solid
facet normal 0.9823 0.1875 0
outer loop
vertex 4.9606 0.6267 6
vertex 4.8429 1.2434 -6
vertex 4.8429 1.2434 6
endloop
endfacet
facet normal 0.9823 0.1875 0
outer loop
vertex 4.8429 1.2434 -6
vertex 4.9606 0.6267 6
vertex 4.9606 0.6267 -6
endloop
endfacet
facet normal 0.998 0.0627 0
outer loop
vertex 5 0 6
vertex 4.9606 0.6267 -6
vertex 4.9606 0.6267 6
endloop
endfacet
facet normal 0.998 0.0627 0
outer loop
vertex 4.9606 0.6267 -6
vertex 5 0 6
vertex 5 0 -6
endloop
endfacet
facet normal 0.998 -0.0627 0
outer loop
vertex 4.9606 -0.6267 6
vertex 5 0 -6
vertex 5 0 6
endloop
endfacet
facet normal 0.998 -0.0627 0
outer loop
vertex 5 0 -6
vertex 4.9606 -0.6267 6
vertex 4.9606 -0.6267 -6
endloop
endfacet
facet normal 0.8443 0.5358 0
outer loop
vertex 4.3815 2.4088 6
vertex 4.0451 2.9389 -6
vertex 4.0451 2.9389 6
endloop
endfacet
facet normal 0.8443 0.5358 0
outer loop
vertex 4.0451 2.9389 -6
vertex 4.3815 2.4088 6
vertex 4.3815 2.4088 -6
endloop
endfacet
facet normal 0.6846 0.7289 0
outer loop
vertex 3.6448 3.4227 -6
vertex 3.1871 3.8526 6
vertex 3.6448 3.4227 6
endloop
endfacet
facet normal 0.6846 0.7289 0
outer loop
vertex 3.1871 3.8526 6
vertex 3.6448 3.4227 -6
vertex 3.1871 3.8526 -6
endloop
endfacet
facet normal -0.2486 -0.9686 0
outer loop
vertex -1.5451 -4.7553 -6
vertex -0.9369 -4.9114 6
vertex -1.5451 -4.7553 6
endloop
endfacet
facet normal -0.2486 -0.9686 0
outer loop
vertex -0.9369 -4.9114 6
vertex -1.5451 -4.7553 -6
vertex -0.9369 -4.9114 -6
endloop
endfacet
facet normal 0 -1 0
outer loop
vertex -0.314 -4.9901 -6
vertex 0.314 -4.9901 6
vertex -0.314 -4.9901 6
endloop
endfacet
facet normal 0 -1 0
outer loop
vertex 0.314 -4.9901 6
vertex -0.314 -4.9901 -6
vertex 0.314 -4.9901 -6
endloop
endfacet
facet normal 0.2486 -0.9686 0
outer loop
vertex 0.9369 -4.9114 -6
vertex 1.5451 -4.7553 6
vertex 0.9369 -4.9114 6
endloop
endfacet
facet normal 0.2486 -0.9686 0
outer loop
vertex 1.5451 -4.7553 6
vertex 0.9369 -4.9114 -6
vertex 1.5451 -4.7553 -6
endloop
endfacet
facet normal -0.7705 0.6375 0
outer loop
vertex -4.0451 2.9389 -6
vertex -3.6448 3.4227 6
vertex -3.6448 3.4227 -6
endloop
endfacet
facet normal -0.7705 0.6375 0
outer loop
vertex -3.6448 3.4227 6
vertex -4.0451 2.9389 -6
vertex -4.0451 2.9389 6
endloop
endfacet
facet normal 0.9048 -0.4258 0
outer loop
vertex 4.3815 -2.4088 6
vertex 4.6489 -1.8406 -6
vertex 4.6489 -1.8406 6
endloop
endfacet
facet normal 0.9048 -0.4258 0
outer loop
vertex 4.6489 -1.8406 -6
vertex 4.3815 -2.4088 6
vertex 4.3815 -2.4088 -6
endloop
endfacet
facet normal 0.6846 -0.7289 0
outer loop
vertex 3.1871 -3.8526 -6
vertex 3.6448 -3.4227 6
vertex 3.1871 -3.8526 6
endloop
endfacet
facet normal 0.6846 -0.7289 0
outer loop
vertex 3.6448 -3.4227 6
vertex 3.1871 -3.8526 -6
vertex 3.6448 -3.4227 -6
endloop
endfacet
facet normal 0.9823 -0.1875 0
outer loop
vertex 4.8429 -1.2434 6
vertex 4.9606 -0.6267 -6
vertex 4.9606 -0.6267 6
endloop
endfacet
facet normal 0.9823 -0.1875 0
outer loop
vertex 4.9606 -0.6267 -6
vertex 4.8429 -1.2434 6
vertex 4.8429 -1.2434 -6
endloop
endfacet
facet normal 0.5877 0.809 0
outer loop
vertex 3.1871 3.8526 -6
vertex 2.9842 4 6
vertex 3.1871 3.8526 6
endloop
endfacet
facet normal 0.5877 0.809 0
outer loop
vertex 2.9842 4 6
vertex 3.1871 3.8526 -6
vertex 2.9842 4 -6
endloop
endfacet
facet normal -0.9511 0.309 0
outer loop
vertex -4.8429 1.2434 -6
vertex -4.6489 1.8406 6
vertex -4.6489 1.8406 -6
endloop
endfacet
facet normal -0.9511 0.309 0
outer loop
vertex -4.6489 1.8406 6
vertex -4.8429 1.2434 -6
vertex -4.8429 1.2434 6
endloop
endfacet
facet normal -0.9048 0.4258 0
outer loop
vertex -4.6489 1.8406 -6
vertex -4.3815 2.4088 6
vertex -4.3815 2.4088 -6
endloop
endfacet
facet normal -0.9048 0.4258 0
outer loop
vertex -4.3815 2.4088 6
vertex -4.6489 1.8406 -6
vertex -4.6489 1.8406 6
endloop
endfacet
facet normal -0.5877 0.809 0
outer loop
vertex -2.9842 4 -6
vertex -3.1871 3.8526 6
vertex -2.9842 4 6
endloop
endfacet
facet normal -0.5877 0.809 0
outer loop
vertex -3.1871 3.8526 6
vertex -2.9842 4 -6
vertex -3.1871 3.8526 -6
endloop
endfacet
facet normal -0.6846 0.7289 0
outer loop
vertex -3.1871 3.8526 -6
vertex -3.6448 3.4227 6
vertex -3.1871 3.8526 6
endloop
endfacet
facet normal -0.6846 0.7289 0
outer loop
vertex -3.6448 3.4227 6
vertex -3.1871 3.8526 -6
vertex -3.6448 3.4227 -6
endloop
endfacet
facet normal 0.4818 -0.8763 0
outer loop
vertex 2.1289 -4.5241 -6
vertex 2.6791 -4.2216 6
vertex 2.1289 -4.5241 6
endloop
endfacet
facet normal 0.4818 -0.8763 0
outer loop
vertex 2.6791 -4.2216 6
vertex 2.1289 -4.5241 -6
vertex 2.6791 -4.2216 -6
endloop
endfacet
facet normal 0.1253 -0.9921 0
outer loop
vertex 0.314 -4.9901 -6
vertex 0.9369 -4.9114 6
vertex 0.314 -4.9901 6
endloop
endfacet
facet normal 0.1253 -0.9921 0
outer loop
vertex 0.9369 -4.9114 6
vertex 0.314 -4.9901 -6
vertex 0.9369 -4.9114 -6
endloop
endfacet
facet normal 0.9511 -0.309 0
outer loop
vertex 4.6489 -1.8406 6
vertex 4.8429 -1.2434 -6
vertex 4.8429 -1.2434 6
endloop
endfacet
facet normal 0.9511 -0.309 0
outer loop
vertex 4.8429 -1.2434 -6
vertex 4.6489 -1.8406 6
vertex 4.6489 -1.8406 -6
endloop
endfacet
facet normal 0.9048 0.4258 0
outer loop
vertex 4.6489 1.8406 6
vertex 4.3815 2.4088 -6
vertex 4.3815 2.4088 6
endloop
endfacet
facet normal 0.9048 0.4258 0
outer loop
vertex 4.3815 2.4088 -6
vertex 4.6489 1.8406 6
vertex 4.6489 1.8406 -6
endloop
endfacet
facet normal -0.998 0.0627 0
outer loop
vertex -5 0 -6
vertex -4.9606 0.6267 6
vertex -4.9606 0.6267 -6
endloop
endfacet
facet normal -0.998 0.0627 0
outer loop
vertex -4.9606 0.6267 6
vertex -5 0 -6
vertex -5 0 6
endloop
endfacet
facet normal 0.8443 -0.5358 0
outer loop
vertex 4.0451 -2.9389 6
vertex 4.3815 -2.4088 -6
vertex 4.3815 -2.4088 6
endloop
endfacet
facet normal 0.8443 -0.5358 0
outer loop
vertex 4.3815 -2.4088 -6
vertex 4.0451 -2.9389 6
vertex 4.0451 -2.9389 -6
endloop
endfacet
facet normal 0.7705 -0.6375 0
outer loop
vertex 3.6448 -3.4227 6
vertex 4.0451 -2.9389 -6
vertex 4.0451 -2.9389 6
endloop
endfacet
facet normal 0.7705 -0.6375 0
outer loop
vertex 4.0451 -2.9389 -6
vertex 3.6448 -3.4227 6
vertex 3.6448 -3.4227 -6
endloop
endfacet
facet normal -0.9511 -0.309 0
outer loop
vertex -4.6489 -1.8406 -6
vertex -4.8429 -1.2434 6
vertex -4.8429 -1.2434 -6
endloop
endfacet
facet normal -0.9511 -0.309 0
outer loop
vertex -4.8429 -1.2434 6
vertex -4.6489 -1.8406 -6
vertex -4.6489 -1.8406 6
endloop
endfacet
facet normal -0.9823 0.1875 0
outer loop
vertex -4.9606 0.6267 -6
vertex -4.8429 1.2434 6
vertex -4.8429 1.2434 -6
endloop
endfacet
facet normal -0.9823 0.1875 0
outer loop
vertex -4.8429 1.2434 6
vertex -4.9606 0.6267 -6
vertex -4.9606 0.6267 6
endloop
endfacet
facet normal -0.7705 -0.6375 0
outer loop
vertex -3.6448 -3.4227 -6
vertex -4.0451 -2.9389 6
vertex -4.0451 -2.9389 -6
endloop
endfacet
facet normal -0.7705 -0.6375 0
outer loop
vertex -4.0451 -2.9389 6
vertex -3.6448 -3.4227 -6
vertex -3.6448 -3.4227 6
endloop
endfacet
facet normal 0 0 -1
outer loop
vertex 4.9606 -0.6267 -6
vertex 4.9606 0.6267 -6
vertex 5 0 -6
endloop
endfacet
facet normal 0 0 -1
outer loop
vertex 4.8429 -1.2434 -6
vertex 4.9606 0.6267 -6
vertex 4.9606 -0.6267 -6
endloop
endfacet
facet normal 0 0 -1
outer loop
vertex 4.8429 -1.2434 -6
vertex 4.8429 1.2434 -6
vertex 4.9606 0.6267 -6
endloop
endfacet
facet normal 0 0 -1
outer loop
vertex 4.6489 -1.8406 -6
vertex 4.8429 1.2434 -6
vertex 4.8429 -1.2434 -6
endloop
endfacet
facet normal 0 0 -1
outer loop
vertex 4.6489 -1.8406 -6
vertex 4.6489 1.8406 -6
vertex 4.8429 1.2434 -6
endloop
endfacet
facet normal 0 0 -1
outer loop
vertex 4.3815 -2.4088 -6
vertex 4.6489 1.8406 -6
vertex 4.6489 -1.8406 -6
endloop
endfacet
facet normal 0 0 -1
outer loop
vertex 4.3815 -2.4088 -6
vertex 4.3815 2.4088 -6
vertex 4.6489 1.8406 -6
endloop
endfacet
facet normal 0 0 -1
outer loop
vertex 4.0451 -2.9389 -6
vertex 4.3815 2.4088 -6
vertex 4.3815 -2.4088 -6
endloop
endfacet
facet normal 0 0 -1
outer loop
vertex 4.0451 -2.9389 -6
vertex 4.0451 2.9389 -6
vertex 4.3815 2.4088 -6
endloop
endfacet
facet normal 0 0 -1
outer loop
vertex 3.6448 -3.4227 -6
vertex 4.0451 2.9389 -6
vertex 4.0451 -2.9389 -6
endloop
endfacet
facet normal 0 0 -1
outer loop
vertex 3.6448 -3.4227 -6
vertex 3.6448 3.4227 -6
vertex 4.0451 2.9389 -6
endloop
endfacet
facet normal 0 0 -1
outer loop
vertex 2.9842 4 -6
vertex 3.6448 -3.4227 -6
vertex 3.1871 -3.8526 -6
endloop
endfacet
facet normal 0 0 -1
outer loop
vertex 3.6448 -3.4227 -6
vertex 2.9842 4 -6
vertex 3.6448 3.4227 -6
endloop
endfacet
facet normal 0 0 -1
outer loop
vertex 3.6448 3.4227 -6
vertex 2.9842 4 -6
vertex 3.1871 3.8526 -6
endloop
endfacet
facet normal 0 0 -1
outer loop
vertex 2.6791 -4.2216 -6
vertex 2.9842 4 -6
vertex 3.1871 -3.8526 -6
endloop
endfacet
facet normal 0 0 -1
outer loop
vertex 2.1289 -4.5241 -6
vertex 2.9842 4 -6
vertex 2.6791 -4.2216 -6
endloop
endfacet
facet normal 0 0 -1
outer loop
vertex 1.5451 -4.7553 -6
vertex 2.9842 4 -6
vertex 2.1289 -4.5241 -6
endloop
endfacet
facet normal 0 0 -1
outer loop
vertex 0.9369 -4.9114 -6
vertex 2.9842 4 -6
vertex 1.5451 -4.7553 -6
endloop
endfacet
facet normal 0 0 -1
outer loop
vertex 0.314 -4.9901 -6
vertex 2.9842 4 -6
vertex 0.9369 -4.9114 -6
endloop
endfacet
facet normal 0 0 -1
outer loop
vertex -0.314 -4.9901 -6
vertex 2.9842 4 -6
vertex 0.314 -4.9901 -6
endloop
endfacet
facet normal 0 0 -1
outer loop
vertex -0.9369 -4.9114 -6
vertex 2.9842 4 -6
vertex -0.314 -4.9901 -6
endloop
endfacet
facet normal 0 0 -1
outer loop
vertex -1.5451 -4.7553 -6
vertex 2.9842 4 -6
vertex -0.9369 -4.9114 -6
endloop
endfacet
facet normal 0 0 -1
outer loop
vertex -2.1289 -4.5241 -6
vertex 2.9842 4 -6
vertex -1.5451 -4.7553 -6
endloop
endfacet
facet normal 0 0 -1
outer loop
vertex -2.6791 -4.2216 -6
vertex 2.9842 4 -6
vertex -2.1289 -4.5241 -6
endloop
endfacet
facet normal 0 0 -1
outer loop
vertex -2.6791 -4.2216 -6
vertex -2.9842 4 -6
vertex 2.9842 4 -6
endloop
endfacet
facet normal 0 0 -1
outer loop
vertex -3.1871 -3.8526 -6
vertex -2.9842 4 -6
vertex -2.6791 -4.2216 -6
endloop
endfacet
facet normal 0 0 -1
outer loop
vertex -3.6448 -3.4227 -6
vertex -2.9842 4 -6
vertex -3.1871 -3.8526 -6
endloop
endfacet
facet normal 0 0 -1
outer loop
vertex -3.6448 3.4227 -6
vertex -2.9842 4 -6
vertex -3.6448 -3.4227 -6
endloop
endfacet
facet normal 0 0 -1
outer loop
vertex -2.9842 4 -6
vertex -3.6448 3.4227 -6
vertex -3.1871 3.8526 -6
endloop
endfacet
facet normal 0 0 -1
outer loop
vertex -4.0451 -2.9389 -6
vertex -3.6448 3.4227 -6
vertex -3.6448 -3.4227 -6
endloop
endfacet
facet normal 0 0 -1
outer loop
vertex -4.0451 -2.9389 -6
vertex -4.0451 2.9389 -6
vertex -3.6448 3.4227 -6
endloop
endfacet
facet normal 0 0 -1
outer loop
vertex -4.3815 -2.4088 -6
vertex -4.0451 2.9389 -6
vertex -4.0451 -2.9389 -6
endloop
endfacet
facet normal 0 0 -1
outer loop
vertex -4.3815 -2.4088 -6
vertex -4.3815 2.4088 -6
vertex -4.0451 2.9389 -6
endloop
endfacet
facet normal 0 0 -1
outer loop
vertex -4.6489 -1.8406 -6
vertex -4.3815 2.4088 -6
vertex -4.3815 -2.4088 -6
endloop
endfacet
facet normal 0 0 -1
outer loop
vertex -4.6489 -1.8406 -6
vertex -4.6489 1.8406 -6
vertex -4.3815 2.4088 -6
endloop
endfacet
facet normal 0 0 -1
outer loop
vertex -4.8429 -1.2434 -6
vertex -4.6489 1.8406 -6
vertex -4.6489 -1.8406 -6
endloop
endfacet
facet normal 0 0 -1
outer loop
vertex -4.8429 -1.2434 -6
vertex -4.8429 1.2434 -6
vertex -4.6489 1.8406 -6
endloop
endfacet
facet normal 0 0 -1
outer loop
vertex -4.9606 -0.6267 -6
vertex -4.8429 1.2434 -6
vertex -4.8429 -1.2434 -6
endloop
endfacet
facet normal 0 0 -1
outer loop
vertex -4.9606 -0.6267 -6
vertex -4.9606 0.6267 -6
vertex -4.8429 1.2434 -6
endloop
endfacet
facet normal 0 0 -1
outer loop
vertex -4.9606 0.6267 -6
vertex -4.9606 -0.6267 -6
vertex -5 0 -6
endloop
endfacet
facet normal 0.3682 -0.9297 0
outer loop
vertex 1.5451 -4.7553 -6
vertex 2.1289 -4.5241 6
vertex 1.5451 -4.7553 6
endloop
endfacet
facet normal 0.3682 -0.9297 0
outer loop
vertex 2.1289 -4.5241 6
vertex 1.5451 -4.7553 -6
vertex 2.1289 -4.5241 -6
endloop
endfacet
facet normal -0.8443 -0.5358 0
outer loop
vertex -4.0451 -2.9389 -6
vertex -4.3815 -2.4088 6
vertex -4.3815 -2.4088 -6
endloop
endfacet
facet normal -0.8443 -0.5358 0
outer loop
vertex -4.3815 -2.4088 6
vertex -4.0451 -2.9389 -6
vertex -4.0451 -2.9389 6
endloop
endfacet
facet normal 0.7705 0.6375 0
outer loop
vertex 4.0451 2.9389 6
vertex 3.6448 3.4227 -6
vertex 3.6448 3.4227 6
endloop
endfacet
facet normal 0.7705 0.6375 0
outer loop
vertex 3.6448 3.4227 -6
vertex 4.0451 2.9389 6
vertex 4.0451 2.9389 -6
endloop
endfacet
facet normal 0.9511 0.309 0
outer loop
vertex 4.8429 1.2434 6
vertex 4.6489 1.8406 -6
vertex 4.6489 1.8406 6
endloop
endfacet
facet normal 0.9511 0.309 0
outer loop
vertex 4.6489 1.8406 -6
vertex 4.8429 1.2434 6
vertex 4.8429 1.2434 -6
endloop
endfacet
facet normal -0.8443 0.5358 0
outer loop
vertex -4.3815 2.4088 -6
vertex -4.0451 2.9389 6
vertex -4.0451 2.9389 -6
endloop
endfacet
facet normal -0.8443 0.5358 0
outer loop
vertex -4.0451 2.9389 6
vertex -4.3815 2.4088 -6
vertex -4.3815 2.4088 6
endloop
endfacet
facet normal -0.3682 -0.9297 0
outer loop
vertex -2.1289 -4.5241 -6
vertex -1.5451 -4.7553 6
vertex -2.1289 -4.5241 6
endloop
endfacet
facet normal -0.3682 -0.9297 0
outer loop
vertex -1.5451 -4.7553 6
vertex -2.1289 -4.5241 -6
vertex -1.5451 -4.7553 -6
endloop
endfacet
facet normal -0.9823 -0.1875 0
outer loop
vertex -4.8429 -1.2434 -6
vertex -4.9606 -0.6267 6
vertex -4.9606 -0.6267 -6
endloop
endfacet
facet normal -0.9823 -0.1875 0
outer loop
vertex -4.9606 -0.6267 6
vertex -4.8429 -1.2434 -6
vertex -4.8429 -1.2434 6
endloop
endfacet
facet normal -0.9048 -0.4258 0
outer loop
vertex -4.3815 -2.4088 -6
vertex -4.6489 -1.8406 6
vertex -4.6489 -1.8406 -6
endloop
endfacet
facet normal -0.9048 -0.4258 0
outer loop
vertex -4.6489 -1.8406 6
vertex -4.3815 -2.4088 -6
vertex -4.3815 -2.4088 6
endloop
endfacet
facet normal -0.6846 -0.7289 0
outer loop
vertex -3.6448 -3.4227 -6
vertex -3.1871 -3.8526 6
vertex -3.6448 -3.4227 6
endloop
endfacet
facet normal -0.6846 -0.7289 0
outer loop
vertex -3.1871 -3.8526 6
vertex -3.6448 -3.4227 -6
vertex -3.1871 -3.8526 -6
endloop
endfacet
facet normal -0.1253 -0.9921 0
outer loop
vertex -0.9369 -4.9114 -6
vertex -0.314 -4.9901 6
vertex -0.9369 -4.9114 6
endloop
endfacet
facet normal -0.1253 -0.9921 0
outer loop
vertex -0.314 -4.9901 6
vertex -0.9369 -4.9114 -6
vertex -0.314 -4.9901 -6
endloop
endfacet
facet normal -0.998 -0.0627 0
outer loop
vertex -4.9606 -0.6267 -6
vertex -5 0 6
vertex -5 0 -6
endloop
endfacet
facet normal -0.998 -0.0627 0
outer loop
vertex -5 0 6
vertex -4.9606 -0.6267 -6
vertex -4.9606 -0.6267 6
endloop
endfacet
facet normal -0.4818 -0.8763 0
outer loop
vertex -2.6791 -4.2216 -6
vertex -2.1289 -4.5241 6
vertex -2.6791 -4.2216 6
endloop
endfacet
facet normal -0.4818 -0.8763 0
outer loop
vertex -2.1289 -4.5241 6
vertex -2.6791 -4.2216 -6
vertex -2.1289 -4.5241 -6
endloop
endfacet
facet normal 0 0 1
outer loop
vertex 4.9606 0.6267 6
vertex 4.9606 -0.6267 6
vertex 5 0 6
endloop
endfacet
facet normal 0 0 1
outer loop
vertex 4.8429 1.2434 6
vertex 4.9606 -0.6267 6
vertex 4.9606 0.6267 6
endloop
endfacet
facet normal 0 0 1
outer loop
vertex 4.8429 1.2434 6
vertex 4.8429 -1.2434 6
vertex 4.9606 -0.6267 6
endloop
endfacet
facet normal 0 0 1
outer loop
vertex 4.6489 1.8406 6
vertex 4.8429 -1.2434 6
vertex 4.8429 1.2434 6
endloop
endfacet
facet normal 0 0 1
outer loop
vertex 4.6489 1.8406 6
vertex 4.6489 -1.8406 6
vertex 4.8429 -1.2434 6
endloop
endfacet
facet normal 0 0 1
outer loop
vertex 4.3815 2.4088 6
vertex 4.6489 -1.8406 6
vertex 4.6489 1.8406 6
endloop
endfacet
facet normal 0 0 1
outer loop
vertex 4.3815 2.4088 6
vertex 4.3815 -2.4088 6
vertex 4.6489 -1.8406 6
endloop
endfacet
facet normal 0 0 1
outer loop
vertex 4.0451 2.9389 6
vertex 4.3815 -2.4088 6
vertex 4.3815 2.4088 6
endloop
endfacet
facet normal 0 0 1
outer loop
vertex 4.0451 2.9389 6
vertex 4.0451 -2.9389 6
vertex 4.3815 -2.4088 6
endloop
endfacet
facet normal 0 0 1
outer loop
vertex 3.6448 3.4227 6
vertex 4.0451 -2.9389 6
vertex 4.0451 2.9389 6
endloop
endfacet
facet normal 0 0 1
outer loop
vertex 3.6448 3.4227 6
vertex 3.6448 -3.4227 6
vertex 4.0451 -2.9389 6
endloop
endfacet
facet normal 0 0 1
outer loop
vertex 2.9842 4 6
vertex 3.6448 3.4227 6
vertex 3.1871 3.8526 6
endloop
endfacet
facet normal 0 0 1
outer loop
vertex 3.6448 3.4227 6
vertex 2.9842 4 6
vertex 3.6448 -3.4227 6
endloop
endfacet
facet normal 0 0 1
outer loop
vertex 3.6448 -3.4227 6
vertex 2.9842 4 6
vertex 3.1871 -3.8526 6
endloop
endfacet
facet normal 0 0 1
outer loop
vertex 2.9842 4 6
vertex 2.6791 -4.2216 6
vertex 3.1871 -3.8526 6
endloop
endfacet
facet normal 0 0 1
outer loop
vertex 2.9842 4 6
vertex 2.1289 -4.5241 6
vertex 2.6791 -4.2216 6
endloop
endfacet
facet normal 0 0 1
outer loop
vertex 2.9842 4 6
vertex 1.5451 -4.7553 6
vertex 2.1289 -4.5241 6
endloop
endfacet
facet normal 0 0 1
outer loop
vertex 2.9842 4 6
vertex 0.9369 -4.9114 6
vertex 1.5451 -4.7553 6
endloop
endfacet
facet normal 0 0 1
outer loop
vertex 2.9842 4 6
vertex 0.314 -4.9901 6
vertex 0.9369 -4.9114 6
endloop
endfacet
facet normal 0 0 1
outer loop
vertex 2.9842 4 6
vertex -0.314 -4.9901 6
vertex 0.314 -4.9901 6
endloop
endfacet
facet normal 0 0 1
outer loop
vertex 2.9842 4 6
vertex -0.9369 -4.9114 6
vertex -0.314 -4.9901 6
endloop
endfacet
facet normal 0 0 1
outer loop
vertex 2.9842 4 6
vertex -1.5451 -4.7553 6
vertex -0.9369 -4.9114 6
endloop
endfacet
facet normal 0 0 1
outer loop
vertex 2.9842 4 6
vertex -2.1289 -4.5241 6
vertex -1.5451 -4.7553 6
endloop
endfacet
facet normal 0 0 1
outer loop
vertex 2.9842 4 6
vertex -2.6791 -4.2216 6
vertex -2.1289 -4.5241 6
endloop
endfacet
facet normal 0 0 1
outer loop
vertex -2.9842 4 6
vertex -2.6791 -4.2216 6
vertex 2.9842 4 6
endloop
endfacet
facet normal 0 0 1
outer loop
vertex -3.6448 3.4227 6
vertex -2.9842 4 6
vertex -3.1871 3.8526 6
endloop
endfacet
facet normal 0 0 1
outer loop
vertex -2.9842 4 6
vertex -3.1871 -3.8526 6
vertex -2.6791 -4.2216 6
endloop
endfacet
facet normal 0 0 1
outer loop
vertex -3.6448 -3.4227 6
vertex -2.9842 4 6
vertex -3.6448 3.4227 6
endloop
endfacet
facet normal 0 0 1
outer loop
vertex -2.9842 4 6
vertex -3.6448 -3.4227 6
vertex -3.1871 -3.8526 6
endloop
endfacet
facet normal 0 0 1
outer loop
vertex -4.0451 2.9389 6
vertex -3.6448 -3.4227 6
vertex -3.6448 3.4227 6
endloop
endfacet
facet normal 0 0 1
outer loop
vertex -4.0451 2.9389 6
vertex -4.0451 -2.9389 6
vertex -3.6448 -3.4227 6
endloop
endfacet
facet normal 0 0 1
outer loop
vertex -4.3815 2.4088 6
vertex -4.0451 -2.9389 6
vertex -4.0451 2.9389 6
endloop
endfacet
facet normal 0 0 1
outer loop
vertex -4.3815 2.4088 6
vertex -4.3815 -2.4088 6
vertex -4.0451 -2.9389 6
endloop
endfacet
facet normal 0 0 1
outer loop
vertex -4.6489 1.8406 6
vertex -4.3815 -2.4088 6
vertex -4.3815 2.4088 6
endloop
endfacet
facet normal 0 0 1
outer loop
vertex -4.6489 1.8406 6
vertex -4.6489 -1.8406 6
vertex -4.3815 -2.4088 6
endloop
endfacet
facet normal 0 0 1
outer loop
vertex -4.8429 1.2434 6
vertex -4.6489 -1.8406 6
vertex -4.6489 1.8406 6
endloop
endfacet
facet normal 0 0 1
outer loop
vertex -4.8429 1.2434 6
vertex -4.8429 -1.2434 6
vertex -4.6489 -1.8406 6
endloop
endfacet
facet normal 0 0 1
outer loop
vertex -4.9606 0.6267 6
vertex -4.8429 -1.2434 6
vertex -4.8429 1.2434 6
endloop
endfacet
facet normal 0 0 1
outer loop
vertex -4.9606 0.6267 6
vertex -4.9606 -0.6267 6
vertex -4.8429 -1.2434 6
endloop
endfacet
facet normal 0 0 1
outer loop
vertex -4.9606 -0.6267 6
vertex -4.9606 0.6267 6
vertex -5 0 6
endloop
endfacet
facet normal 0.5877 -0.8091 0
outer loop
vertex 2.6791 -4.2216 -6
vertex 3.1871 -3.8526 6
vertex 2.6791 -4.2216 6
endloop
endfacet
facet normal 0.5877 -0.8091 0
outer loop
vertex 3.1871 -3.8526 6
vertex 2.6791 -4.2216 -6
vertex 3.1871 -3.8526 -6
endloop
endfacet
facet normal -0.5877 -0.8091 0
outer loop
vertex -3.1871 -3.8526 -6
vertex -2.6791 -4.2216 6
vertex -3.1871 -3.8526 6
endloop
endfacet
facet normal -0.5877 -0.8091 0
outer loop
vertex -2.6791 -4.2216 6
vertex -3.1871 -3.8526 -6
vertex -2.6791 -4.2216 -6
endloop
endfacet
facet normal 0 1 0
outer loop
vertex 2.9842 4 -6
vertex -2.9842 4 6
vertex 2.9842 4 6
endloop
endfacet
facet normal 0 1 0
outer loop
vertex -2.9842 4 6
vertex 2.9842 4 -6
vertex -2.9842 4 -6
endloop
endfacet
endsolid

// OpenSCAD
$fn = 50;

difference() {
	union() {
		translate(v = [0, 0, 0]) {
			rotate(a = [0, 0, 0]) {
				difference() {
					union() {
						translate(v = [0, 0, -6.0]) {
							cylinder(h = 12, r = 5);
						}
					}
					union() {
						translate(v = [-5.1, 4, -6.1]) {
							cube(size = [10.2, 1.1, 12.2]);
						}
					}
				}
			}
		}
	}
	union();
}
